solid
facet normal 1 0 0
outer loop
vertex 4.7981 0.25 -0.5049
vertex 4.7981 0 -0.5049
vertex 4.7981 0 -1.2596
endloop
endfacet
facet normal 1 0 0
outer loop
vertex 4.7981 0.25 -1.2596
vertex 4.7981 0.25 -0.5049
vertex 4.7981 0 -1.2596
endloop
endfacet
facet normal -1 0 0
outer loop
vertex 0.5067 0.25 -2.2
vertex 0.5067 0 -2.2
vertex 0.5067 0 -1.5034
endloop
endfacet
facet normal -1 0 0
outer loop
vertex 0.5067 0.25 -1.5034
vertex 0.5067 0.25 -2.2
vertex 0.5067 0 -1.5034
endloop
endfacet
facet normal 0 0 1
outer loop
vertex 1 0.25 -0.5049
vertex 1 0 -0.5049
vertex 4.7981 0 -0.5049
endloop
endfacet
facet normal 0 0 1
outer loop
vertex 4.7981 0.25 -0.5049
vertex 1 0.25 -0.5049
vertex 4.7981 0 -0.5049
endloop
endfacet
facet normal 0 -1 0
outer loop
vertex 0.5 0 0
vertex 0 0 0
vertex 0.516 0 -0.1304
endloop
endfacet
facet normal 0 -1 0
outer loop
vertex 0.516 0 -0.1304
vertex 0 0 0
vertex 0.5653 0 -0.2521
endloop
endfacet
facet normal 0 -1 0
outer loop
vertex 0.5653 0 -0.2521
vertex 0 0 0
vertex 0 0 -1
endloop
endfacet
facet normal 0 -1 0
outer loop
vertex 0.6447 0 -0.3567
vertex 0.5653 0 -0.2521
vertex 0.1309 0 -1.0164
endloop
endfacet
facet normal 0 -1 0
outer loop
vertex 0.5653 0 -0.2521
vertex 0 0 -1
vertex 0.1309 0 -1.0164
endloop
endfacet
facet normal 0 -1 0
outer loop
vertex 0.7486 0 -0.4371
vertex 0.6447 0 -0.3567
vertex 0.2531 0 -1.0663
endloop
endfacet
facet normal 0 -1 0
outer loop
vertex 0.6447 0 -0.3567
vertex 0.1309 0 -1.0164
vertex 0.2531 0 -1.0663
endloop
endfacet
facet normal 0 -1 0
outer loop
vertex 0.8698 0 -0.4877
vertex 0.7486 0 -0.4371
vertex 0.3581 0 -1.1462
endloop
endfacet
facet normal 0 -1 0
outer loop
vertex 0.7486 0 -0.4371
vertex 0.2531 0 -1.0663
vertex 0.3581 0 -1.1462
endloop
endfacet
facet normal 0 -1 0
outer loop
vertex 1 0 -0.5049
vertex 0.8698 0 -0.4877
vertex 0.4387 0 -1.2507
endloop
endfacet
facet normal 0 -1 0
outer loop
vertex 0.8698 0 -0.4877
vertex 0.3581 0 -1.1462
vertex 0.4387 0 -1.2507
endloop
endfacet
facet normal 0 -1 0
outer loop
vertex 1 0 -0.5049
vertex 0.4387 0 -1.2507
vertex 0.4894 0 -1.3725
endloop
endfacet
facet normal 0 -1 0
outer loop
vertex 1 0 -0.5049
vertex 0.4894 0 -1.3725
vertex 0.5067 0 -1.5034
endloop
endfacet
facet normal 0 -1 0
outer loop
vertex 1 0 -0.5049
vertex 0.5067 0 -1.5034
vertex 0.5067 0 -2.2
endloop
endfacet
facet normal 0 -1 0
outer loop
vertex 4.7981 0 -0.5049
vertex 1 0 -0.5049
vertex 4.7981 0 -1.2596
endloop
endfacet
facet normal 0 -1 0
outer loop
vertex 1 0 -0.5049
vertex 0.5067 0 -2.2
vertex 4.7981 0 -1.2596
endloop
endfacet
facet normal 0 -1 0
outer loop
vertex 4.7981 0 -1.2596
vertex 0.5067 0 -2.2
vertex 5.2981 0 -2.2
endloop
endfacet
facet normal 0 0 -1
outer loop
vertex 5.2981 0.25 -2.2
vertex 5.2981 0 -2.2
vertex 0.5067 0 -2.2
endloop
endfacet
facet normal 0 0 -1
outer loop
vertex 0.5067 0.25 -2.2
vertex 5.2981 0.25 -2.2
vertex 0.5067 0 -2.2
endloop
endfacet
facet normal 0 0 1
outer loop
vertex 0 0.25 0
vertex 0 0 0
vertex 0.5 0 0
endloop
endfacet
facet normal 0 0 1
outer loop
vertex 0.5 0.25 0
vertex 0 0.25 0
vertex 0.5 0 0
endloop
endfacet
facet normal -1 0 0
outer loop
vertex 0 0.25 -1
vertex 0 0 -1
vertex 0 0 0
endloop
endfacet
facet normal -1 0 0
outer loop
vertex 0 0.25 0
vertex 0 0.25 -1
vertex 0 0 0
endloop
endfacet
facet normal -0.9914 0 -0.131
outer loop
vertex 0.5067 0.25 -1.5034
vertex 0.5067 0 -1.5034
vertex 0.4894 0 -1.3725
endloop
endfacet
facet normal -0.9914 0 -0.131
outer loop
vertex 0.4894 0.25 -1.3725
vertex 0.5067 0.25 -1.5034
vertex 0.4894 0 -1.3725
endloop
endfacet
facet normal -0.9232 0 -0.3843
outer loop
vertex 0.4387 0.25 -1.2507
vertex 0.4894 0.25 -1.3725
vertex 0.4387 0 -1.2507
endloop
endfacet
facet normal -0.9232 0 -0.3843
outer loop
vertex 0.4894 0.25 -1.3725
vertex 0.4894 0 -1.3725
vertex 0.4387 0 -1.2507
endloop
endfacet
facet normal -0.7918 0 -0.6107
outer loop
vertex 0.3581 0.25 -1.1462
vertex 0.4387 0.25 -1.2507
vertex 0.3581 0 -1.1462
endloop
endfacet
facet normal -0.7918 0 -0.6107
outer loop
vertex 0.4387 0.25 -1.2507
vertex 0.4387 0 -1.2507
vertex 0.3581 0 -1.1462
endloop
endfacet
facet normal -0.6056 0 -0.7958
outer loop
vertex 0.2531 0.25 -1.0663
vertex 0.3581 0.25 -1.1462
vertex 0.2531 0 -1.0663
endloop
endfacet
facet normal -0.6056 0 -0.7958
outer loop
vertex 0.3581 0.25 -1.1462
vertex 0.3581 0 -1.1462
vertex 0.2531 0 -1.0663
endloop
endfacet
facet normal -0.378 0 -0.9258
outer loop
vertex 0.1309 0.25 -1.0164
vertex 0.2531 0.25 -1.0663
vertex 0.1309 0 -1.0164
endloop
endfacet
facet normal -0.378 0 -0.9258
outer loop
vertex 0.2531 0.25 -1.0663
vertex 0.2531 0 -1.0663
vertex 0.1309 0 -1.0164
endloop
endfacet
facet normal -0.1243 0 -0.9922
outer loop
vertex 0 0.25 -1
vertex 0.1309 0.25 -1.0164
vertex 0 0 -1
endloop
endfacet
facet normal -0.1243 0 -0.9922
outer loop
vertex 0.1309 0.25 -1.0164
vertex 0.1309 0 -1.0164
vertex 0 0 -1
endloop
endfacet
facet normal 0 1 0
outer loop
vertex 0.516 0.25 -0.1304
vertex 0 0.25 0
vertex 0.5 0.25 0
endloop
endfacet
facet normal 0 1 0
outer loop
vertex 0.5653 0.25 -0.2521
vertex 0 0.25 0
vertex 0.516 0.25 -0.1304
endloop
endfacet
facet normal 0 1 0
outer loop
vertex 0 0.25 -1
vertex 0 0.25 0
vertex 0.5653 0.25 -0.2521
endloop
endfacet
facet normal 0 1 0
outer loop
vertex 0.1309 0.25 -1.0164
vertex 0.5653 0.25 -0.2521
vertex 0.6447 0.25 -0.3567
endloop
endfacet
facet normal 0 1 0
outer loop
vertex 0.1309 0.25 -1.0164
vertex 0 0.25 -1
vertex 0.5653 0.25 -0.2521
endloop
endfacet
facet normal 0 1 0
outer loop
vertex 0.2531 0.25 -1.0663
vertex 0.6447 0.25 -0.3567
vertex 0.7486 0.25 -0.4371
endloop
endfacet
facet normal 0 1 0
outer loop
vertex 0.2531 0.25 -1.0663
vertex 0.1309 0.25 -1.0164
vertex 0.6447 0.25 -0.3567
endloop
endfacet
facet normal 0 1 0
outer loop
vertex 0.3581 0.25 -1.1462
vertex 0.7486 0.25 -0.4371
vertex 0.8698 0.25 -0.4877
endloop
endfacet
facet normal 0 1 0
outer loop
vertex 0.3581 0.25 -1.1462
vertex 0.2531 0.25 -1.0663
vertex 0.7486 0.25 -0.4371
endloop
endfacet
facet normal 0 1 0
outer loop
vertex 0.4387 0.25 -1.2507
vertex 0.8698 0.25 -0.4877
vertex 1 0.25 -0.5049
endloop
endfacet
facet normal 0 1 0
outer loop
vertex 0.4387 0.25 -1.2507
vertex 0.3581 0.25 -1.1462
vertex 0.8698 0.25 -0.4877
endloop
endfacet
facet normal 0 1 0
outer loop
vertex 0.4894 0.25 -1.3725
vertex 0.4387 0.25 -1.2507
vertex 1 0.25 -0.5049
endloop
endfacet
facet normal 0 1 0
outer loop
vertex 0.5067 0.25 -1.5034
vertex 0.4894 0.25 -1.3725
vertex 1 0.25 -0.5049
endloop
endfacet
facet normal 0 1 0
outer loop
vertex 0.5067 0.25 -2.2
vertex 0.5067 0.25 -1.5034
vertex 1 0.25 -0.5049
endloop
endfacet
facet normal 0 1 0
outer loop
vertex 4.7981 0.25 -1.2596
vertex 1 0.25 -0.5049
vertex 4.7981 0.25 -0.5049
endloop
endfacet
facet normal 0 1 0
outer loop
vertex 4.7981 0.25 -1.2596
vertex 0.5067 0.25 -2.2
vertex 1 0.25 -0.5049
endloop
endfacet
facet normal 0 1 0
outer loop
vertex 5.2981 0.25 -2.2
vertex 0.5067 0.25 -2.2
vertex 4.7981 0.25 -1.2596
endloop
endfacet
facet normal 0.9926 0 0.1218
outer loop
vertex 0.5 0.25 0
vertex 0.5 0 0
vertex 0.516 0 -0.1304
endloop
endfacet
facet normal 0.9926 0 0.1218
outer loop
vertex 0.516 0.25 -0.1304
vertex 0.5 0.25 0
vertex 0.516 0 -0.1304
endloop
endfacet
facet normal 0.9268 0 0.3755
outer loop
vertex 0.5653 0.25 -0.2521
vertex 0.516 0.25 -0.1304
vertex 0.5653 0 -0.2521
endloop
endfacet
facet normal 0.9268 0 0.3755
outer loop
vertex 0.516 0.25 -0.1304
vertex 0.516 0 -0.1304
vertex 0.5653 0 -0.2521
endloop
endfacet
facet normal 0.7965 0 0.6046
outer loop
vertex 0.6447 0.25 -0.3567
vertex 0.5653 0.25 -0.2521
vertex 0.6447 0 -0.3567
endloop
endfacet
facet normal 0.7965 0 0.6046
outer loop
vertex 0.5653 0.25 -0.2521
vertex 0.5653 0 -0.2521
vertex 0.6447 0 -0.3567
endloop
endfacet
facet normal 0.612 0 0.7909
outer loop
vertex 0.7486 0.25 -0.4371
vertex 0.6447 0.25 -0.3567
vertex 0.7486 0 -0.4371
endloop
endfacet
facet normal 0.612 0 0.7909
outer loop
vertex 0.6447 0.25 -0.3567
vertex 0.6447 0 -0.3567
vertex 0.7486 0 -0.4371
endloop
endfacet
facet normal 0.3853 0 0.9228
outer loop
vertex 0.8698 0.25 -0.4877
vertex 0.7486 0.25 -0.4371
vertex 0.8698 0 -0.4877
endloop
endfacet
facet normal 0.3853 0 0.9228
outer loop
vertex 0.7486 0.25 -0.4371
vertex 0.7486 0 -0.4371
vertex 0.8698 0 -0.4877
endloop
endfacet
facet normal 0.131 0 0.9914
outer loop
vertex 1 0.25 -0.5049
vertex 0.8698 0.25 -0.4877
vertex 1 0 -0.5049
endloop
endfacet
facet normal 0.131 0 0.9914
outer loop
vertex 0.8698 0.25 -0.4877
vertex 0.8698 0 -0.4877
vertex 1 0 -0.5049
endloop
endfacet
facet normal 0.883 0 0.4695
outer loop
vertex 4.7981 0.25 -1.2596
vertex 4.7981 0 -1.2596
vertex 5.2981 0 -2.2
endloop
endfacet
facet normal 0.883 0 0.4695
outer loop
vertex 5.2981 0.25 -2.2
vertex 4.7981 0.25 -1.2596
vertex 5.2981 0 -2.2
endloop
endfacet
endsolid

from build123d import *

# Parameters (mm, degrees)
BOSS_EXTRUDE1_DEPTH = 0.25


with BuildPart() as part:
    # Sketch2 → Boss-Extrude1 (new body)
    with BuildSketch(Plane(origin=(0, 0, 0), x_dir=(1, 0, 0), z_dir=(0, 1, 0))):
        with BuildLine():
            Line((0, 0), (0.5, 0))
            ThreePointArc((0.5, 0), (0.644690069, 0.356724455), (0.999975872, 0.504912007))
            Line((0.999975872, 0.504912007), (4.798067741, 0.504912007))
            Line((4.798067741, 0.504912007), (4.798067741, 1.259636767))
            Line((4.798067741, 1.259636767), (5.298067741, 2.2))
            Line((5.298067741, 2.2), (0.506730751, 2.2))
            Line((0.506730751, 2.2), (0.506730751, 1.503359769))
            ThreePointArc((0.506730751, 1.503359769), (0.358106958, 1.146236852), (0, 1))
            Line((0, 1), (0, 0))
        make_face()
    extrude(amount=BOSS_EXTRUDE1_DEPTH)


solid = part.part
